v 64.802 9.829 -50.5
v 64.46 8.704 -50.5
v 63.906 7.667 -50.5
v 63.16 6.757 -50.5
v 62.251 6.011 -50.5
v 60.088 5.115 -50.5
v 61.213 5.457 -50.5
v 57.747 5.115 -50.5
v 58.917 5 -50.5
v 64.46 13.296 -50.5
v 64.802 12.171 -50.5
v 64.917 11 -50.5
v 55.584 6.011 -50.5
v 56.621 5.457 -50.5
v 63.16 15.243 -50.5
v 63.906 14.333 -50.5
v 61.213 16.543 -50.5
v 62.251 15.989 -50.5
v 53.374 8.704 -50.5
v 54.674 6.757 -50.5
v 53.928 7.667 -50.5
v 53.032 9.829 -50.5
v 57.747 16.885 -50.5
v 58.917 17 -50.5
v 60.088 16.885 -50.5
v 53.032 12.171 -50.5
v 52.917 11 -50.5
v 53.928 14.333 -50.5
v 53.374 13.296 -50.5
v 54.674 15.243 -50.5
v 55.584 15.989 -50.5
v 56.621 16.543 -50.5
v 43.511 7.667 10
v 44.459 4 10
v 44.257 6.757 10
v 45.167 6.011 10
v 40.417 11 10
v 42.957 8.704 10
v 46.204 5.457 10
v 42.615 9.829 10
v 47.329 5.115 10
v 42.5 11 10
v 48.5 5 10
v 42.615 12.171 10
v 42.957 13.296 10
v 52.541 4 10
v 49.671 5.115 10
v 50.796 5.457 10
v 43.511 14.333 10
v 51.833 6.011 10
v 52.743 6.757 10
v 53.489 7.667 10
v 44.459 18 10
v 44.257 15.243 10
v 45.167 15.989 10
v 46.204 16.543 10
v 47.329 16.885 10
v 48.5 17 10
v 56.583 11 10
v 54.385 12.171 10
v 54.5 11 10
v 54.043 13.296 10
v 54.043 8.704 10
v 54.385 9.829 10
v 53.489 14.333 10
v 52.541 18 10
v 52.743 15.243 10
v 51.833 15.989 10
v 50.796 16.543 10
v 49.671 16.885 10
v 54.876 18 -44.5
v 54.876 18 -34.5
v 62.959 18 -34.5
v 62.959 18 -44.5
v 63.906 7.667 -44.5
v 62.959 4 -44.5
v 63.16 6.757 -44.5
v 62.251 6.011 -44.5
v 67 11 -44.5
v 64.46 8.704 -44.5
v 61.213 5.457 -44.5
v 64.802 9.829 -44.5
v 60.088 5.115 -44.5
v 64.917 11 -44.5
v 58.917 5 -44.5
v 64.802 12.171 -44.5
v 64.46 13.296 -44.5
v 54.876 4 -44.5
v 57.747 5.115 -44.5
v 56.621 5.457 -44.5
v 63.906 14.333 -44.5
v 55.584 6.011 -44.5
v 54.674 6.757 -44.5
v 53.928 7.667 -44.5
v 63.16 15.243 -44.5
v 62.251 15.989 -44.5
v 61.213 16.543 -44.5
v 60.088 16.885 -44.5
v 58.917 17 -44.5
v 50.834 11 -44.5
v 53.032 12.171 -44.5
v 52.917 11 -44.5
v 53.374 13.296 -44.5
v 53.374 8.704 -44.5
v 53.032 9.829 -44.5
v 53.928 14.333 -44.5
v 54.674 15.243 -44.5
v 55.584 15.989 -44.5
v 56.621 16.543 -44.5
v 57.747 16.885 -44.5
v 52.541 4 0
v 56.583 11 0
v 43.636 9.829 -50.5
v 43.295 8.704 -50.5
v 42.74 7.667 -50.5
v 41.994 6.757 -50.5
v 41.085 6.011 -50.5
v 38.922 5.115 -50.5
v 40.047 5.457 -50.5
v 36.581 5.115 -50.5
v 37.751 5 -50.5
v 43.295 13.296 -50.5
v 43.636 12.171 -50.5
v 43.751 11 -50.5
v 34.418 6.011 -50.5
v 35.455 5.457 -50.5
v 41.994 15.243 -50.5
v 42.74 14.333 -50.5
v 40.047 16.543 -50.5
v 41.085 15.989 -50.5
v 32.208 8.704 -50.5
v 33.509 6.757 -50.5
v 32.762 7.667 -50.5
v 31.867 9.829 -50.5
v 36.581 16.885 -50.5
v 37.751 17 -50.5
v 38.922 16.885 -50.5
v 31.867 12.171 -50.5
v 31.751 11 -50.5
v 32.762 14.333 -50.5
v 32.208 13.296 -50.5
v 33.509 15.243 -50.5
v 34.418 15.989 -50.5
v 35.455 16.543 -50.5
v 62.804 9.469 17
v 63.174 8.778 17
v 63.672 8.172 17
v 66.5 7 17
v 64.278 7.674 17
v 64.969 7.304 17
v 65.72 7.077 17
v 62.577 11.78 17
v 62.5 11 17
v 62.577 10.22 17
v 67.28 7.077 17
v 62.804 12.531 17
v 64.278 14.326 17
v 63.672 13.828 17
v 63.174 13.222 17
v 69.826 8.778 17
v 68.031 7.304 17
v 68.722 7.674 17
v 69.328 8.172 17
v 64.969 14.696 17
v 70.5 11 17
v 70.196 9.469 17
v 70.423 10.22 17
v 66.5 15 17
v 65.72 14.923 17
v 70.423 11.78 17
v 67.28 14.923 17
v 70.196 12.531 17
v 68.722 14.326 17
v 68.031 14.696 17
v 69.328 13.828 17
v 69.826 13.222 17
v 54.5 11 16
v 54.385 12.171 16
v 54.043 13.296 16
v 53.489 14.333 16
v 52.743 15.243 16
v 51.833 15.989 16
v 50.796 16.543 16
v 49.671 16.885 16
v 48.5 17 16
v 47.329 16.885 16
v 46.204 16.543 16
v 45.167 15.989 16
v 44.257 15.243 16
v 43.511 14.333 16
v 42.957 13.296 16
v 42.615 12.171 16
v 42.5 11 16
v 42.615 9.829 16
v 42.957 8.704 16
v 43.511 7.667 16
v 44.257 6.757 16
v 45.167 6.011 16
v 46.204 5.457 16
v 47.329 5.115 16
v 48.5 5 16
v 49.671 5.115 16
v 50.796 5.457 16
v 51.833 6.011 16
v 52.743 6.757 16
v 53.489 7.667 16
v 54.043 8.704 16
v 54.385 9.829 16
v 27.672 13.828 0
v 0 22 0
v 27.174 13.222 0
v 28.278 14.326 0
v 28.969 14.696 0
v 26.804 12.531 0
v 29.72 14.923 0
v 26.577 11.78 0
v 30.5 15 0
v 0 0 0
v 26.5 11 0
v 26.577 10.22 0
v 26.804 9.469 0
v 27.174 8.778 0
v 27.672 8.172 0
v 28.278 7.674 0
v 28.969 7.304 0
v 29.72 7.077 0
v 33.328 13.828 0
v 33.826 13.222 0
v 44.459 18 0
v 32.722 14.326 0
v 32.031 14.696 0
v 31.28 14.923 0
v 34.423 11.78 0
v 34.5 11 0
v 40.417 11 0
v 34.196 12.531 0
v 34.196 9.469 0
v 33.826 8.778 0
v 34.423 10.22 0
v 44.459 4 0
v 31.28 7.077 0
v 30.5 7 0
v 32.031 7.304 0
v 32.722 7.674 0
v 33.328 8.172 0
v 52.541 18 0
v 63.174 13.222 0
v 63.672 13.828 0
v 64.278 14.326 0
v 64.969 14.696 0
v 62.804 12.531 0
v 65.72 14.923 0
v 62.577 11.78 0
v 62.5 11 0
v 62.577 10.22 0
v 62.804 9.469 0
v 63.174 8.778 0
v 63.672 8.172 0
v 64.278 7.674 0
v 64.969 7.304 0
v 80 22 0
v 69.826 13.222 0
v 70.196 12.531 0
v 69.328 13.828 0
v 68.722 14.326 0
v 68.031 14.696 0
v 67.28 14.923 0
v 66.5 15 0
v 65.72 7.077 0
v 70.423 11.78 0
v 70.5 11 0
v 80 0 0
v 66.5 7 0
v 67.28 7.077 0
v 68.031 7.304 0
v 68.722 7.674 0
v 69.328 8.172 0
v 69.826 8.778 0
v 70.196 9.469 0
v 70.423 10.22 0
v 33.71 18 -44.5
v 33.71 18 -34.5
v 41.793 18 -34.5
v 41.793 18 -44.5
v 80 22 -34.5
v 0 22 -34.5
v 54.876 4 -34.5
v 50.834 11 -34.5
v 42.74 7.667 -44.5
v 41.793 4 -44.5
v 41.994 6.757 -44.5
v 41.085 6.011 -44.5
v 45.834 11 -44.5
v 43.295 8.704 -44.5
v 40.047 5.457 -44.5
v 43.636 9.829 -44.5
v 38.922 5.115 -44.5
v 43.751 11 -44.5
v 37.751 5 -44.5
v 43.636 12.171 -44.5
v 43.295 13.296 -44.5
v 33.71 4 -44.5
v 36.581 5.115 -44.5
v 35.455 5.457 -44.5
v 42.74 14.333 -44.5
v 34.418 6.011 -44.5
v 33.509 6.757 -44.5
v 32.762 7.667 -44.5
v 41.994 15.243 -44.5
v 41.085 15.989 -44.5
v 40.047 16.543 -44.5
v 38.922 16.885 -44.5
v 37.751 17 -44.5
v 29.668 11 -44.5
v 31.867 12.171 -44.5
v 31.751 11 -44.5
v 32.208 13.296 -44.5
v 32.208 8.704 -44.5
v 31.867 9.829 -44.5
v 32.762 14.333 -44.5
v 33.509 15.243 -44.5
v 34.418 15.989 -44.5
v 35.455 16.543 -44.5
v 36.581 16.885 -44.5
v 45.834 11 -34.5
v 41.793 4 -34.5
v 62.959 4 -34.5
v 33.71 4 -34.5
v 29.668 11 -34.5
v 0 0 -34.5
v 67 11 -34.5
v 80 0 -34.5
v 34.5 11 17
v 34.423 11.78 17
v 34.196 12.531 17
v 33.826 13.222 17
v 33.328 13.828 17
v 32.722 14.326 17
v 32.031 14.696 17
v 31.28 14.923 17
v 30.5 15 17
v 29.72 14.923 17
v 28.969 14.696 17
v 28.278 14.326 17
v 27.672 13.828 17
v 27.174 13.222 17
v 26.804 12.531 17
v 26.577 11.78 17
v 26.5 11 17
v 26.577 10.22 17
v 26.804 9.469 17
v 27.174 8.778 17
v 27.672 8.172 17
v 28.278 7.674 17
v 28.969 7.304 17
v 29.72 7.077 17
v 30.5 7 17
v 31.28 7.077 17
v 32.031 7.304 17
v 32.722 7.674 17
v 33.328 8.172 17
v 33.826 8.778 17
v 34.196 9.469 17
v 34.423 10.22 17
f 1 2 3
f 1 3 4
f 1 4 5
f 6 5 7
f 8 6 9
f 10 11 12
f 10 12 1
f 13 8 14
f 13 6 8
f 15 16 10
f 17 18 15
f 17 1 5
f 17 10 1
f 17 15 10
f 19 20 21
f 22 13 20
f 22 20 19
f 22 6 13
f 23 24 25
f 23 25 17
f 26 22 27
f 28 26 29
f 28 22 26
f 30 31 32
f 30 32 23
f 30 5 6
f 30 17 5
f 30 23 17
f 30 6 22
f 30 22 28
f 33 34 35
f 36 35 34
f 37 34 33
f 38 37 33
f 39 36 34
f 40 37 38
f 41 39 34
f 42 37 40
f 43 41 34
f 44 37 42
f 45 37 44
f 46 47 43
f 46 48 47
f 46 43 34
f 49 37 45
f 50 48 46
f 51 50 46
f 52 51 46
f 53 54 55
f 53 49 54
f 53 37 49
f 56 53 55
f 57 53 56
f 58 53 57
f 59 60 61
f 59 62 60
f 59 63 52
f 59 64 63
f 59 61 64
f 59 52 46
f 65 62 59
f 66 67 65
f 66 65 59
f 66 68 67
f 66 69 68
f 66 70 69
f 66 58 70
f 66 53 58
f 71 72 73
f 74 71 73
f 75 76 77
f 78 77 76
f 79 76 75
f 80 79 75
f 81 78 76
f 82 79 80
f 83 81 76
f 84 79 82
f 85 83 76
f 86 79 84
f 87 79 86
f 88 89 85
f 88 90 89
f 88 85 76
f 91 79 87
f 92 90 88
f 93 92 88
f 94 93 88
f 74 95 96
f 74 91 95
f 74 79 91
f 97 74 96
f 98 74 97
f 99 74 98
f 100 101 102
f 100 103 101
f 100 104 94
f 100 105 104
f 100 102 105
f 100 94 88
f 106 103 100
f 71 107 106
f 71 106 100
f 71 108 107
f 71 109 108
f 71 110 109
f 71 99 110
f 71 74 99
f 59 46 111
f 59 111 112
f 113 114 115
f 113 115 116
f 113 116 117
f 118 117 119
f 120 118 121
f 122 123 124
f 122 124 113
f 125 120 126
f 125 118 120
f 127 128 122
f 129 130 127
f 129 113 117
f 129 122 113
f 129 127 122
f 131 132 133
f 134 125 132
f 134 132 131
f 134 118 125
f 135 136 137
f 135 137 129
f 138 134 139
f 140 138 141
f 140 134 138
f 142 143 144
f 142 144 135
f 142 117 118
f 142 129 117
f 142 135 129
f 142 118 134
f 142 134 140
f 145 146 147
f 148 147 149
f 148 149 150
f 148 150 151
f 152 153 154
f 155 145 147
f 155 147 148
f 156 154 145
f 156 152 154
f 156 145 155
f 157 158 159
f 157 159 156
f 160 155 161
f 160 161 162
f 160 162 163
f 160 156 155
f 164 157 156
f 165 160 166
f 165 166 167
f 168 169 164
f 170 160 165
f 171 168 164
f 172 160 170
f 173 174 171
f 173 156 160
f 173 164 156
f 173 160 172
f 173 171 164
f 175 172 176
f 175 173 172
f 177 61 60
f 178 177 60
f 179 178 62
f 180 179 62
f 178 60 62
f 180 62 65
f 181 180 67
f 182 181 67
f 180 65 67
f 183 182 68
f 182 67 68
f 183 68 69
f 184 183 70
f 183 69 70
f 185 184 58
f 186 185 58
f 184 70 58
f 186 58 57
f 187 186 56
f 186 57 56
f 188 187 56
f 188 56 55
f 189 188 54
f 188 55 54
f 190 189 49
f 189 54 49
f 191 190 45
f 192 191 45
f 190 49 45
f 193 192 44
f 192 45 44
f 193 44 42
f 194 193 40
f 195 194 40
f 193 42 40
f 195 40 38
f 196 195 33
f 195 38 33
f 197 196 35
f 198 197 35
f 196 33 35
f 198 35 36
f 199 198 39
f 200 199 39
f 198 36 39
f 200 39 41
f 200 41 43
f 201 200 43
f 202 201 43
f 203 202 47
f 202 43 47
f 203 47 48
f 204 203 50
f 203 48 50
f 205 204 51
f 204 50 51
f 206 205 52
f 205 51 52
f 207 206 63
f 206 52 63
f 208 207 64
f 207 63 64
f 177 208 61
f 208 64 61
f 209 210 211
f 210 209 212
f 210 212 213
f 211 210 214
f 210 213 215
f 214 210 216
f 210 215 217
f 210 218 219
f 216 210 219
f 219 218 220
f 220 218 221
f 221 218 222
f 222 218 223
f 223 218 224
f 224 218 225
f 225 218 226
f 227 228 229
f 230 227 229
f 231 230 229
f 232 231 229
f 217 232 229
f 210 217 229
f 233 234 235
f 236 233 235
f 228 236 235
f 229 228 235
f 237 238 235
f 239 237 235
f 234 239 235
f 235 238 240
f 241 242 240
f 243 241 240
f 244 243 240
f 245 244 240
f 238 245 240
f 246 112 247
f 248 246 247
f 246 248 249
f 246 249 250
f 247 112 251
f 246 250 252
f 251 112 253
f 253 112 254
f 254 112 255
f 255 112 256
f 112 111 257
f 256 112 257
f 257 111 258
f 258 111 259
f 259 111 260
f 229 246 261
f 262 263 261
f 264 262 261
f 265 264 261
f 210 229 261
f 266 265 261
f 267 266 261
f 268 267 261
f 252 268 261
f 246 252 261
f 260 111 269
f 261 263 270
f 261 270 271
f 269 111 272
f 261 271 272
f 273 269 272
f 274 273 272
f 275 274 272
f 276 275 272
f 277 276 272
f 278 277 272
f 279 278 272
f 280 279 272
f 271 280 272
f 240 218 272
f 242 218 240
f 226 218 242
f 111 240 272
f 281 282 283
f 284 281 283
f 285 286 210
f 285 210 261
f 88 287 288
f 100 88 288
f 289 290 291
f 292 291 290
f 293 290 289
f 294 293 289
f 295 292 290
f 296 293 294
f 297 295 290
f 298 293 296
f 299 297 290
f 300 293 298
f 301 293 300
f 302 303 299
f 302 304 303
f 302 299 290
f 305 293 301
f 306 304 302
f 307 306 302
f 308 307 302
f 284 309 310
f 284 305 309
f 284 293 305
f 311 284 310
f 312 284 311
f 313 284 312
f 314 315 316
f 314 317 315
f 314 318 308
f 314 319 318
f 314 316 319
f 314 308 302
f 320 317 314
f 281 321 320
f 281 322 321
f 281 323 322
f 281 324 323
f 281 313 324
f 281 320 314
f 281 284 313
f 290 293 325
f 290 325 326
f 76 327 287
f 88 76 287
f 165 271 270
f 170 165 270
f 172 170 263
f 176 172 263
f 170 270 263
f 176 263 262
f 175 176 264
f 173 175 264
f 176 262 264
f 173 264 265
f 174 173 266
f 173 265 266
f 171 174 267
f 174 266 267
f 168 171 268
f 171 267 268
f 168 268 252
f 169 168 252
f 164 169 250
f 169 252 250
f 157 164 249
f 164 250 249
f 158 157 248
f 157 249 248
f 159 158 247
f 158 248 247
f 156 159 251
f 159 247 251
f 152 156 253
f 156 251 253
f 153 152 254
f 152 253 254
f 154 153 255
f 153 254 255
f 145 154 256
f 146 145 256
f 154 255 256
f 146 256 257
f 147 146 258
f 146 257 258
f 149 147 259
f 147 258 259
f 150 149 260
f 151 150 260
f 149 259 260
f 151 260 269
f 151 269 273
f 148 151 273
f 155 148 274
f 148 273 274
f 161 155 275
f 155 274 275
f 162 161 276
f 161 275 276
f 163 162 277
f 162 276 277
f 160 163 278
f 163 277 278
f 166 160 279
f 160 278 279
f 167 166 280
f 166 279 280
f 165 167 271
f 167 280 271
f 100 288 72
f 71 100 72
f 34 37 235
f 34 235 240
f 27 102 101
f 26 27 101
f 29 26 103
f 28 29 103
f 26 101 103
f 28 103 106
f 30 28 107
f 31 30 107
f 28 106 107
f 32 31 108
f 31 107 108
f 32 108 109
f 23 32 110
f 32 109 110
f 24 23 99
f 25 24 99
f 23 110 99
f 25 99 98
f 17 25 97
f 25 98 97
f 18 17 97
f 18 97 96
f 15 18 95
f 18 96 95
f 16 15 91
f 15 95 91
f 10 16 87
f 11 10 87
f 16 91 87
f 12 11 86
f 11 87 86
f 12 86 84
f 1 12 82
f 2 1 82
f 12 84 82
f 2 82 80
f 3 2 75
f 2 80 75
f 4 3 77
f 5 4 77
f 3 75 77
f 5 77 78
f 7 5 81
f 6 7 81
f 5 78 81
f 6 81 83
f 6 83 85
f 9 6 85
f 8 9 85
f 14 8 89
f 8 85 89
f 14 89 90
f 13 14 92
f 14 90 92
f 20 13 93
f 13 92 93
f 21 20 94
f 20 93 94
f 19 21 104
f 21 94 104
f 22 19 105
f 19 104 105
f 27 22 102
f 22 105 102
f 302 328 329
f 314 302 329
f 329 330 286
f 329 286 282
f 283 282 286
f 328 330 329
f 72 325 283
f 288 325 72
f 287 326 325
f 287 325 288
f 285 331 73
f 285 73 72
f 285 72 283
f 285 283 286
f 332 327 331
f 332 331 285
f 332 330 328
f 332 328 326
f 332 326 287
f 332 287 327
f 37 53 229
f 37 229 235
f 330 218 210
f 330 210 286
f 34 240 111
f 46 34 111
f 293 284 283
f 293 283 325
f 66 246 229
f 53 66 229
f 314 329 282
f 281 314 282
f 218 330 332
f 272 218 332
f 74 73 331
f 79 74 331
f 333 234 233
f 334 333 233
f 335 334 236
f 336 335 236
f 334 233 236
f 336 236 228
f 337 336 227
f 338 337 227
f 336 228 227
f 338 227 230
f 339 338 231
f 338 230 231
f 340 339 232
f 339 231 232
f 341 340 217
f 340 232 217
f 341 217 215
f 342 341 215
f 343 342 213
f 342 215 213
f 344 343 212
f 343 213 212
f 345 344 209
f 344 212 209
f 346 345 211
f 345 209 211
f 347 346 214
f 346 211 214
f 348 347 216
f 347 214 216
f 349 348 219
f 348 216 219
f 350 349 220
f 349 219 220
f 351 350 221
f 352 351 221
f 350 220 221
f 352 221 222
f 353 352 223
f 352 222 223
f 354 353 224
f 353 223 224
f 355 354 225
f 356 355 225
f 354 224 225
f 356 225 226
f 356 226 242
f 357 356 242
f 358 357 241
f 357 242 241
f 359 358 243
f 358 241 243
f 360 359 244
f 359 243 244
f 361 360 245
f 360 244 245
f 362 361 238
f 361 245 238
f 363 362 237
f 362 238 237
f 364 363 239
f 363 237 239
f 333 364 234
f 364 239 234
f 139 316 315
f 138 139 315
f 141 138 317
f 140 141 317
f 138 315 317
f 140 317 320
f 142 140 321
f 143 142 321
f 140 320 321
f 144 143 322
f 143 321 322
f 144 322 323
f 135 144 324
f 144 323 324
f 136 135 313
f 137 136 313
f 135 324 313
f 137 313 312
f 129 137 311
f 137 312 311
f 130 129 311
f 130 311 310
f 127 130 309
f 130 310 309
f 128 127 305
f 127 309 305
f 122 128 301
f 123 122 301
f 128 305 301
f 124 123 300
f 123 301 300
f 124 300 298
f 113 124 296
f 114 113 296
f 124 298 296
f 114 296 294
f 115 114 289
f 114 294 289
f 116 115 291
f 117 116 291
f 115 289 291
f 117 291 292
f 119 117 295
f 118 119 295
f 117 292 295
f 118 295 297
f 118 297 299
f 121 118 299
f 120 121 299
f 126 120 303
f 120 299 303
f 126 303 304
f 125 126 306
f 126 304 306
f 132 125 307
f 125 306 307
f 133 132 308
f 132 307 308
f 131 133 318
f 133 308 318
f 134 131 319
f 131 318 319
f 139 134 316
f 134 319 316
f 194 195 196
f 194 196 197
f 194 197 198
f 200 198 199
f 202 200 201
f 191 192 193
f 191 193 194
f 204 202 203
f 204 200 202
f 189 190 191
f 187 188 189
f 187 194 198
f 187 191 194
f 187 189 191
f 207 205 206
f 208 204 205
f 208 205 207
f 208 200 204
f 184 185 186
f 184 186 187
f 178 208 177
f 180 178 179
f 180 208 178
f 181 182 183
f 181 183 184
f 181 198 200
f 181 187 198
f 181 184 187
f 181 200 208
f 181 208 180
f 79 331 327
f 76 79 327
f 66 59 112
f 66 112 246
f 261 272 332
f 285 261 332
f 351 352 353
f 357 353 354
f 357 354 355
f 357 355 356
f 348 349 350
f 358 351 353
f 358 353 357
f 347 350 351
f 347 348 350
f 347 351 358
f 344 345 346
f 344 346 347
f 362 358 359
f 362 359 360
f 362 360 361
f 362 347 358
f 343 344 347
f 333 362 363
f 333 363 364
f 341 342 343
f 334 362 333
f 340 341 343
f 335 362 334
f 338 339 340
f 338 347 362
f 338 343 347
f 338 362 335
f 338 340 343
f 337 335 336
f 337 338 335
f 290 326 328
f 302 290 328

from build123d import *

# Parameters (mm, degrees)
SKETCH1_W           = 80
SKETCH1_H           = 34.5
BOSS_EXTRUDE1_DEPTH = 22
SKETCH2_R           = 4
BOSS_EXTRUDE2_DEPTH = 17
BOSS_EXTRUDE3_DEPTH = 10
BOSS_EXTRUDE6_DEPTH = 10
SKETCH7_R           = 6
BOSS_EXTRUDE7_DEPTH = 6
SKETCH8_R           = 6
BOSS_EXTRUDE8_DEPTH = 6


with BuildPart() as part:
    # Sketch1 → Boss-Extrude1 (new body)
    with BuildSketch(Plane(origin=(0, 0, 0), x_dir=(1, 0, 0), z_dir=(0, 1, 0))):
        with Locations((40, 17.25)):
            Rectangle(SKETCH1_W, SKETCH1_H)
    extrude(amount=BOSS_EXTRUDE1_DEPTH)

    # Sketch2 → Boss-Extrude2 (add)
    with BuildSketch(Plane.XY):
        with Locations((30.5, 11)):
            Circle(SKETCH2_R)
        with Locations((66.5, 11)):
            Circle(SKETCH2_R)
    extrude(amount=BOSS_EXTRUDE2_DEPTH)

    # Sketch3 → Boss-Extrude3 (add)
    with BuildSketch(Plane(origin=(0, 0, -34.5), x_dir=(-1, 0, 0), z_dir=(0, 0, -1))):
        Polygon((-50.834192463, 11), (-54.875644347, 18), (-62.958548116, 18), (-67, 11), (-62.958548116, 4), (-54.875644347, 4), align=None)
        Polygon((-29.668384925, 11), (-33.70983681, 18), (-41.792740578, 18), (-45.834192463, 11), (-41.792740578, 4), (-33.70983681, 4), align=None)
    extrude(amount=BOSS_EXTRUDE3_DEPTH)

    # Sketch6 → Boss-Extrude6 (add)
    with BuildSketch(Plane.XY):
        Polygon((56.582903769, 11), (52.541451884, 18), (44.458548116, 18), (40.417096231, 11), (44.458548116, 4), (52.541451884, 4), align=None)
    extrude(amount=BOSS_EXTRUDE6_DEPTH)

    # Sketch7 → Boss-Extrude7 (add)
    with BuildSketch(Plane.XY.offset(10)):
        with Locations((48.5, 11)):
            Circle(SKETCH7_R)
    extrude(amount=BOSS_EXTRUDE7_DEPTH)

    # Sketch8 → Boss-Extrude8 (add)
    with BuildSketch(Plane(origin=(0, 0, -44.5), x_dir=(-1, 0, 0), z_dir=(0, 0, -1))):
        with Locations((-58.917096231, 11)):
            Circle(SKETCH8_R)
        with Locations((-37.751288694, 11)):
            Circle(SKETCH8_R)
    extrude(amount=BOSS_EXTRUDE8_DEPTH)


solid = part.part
